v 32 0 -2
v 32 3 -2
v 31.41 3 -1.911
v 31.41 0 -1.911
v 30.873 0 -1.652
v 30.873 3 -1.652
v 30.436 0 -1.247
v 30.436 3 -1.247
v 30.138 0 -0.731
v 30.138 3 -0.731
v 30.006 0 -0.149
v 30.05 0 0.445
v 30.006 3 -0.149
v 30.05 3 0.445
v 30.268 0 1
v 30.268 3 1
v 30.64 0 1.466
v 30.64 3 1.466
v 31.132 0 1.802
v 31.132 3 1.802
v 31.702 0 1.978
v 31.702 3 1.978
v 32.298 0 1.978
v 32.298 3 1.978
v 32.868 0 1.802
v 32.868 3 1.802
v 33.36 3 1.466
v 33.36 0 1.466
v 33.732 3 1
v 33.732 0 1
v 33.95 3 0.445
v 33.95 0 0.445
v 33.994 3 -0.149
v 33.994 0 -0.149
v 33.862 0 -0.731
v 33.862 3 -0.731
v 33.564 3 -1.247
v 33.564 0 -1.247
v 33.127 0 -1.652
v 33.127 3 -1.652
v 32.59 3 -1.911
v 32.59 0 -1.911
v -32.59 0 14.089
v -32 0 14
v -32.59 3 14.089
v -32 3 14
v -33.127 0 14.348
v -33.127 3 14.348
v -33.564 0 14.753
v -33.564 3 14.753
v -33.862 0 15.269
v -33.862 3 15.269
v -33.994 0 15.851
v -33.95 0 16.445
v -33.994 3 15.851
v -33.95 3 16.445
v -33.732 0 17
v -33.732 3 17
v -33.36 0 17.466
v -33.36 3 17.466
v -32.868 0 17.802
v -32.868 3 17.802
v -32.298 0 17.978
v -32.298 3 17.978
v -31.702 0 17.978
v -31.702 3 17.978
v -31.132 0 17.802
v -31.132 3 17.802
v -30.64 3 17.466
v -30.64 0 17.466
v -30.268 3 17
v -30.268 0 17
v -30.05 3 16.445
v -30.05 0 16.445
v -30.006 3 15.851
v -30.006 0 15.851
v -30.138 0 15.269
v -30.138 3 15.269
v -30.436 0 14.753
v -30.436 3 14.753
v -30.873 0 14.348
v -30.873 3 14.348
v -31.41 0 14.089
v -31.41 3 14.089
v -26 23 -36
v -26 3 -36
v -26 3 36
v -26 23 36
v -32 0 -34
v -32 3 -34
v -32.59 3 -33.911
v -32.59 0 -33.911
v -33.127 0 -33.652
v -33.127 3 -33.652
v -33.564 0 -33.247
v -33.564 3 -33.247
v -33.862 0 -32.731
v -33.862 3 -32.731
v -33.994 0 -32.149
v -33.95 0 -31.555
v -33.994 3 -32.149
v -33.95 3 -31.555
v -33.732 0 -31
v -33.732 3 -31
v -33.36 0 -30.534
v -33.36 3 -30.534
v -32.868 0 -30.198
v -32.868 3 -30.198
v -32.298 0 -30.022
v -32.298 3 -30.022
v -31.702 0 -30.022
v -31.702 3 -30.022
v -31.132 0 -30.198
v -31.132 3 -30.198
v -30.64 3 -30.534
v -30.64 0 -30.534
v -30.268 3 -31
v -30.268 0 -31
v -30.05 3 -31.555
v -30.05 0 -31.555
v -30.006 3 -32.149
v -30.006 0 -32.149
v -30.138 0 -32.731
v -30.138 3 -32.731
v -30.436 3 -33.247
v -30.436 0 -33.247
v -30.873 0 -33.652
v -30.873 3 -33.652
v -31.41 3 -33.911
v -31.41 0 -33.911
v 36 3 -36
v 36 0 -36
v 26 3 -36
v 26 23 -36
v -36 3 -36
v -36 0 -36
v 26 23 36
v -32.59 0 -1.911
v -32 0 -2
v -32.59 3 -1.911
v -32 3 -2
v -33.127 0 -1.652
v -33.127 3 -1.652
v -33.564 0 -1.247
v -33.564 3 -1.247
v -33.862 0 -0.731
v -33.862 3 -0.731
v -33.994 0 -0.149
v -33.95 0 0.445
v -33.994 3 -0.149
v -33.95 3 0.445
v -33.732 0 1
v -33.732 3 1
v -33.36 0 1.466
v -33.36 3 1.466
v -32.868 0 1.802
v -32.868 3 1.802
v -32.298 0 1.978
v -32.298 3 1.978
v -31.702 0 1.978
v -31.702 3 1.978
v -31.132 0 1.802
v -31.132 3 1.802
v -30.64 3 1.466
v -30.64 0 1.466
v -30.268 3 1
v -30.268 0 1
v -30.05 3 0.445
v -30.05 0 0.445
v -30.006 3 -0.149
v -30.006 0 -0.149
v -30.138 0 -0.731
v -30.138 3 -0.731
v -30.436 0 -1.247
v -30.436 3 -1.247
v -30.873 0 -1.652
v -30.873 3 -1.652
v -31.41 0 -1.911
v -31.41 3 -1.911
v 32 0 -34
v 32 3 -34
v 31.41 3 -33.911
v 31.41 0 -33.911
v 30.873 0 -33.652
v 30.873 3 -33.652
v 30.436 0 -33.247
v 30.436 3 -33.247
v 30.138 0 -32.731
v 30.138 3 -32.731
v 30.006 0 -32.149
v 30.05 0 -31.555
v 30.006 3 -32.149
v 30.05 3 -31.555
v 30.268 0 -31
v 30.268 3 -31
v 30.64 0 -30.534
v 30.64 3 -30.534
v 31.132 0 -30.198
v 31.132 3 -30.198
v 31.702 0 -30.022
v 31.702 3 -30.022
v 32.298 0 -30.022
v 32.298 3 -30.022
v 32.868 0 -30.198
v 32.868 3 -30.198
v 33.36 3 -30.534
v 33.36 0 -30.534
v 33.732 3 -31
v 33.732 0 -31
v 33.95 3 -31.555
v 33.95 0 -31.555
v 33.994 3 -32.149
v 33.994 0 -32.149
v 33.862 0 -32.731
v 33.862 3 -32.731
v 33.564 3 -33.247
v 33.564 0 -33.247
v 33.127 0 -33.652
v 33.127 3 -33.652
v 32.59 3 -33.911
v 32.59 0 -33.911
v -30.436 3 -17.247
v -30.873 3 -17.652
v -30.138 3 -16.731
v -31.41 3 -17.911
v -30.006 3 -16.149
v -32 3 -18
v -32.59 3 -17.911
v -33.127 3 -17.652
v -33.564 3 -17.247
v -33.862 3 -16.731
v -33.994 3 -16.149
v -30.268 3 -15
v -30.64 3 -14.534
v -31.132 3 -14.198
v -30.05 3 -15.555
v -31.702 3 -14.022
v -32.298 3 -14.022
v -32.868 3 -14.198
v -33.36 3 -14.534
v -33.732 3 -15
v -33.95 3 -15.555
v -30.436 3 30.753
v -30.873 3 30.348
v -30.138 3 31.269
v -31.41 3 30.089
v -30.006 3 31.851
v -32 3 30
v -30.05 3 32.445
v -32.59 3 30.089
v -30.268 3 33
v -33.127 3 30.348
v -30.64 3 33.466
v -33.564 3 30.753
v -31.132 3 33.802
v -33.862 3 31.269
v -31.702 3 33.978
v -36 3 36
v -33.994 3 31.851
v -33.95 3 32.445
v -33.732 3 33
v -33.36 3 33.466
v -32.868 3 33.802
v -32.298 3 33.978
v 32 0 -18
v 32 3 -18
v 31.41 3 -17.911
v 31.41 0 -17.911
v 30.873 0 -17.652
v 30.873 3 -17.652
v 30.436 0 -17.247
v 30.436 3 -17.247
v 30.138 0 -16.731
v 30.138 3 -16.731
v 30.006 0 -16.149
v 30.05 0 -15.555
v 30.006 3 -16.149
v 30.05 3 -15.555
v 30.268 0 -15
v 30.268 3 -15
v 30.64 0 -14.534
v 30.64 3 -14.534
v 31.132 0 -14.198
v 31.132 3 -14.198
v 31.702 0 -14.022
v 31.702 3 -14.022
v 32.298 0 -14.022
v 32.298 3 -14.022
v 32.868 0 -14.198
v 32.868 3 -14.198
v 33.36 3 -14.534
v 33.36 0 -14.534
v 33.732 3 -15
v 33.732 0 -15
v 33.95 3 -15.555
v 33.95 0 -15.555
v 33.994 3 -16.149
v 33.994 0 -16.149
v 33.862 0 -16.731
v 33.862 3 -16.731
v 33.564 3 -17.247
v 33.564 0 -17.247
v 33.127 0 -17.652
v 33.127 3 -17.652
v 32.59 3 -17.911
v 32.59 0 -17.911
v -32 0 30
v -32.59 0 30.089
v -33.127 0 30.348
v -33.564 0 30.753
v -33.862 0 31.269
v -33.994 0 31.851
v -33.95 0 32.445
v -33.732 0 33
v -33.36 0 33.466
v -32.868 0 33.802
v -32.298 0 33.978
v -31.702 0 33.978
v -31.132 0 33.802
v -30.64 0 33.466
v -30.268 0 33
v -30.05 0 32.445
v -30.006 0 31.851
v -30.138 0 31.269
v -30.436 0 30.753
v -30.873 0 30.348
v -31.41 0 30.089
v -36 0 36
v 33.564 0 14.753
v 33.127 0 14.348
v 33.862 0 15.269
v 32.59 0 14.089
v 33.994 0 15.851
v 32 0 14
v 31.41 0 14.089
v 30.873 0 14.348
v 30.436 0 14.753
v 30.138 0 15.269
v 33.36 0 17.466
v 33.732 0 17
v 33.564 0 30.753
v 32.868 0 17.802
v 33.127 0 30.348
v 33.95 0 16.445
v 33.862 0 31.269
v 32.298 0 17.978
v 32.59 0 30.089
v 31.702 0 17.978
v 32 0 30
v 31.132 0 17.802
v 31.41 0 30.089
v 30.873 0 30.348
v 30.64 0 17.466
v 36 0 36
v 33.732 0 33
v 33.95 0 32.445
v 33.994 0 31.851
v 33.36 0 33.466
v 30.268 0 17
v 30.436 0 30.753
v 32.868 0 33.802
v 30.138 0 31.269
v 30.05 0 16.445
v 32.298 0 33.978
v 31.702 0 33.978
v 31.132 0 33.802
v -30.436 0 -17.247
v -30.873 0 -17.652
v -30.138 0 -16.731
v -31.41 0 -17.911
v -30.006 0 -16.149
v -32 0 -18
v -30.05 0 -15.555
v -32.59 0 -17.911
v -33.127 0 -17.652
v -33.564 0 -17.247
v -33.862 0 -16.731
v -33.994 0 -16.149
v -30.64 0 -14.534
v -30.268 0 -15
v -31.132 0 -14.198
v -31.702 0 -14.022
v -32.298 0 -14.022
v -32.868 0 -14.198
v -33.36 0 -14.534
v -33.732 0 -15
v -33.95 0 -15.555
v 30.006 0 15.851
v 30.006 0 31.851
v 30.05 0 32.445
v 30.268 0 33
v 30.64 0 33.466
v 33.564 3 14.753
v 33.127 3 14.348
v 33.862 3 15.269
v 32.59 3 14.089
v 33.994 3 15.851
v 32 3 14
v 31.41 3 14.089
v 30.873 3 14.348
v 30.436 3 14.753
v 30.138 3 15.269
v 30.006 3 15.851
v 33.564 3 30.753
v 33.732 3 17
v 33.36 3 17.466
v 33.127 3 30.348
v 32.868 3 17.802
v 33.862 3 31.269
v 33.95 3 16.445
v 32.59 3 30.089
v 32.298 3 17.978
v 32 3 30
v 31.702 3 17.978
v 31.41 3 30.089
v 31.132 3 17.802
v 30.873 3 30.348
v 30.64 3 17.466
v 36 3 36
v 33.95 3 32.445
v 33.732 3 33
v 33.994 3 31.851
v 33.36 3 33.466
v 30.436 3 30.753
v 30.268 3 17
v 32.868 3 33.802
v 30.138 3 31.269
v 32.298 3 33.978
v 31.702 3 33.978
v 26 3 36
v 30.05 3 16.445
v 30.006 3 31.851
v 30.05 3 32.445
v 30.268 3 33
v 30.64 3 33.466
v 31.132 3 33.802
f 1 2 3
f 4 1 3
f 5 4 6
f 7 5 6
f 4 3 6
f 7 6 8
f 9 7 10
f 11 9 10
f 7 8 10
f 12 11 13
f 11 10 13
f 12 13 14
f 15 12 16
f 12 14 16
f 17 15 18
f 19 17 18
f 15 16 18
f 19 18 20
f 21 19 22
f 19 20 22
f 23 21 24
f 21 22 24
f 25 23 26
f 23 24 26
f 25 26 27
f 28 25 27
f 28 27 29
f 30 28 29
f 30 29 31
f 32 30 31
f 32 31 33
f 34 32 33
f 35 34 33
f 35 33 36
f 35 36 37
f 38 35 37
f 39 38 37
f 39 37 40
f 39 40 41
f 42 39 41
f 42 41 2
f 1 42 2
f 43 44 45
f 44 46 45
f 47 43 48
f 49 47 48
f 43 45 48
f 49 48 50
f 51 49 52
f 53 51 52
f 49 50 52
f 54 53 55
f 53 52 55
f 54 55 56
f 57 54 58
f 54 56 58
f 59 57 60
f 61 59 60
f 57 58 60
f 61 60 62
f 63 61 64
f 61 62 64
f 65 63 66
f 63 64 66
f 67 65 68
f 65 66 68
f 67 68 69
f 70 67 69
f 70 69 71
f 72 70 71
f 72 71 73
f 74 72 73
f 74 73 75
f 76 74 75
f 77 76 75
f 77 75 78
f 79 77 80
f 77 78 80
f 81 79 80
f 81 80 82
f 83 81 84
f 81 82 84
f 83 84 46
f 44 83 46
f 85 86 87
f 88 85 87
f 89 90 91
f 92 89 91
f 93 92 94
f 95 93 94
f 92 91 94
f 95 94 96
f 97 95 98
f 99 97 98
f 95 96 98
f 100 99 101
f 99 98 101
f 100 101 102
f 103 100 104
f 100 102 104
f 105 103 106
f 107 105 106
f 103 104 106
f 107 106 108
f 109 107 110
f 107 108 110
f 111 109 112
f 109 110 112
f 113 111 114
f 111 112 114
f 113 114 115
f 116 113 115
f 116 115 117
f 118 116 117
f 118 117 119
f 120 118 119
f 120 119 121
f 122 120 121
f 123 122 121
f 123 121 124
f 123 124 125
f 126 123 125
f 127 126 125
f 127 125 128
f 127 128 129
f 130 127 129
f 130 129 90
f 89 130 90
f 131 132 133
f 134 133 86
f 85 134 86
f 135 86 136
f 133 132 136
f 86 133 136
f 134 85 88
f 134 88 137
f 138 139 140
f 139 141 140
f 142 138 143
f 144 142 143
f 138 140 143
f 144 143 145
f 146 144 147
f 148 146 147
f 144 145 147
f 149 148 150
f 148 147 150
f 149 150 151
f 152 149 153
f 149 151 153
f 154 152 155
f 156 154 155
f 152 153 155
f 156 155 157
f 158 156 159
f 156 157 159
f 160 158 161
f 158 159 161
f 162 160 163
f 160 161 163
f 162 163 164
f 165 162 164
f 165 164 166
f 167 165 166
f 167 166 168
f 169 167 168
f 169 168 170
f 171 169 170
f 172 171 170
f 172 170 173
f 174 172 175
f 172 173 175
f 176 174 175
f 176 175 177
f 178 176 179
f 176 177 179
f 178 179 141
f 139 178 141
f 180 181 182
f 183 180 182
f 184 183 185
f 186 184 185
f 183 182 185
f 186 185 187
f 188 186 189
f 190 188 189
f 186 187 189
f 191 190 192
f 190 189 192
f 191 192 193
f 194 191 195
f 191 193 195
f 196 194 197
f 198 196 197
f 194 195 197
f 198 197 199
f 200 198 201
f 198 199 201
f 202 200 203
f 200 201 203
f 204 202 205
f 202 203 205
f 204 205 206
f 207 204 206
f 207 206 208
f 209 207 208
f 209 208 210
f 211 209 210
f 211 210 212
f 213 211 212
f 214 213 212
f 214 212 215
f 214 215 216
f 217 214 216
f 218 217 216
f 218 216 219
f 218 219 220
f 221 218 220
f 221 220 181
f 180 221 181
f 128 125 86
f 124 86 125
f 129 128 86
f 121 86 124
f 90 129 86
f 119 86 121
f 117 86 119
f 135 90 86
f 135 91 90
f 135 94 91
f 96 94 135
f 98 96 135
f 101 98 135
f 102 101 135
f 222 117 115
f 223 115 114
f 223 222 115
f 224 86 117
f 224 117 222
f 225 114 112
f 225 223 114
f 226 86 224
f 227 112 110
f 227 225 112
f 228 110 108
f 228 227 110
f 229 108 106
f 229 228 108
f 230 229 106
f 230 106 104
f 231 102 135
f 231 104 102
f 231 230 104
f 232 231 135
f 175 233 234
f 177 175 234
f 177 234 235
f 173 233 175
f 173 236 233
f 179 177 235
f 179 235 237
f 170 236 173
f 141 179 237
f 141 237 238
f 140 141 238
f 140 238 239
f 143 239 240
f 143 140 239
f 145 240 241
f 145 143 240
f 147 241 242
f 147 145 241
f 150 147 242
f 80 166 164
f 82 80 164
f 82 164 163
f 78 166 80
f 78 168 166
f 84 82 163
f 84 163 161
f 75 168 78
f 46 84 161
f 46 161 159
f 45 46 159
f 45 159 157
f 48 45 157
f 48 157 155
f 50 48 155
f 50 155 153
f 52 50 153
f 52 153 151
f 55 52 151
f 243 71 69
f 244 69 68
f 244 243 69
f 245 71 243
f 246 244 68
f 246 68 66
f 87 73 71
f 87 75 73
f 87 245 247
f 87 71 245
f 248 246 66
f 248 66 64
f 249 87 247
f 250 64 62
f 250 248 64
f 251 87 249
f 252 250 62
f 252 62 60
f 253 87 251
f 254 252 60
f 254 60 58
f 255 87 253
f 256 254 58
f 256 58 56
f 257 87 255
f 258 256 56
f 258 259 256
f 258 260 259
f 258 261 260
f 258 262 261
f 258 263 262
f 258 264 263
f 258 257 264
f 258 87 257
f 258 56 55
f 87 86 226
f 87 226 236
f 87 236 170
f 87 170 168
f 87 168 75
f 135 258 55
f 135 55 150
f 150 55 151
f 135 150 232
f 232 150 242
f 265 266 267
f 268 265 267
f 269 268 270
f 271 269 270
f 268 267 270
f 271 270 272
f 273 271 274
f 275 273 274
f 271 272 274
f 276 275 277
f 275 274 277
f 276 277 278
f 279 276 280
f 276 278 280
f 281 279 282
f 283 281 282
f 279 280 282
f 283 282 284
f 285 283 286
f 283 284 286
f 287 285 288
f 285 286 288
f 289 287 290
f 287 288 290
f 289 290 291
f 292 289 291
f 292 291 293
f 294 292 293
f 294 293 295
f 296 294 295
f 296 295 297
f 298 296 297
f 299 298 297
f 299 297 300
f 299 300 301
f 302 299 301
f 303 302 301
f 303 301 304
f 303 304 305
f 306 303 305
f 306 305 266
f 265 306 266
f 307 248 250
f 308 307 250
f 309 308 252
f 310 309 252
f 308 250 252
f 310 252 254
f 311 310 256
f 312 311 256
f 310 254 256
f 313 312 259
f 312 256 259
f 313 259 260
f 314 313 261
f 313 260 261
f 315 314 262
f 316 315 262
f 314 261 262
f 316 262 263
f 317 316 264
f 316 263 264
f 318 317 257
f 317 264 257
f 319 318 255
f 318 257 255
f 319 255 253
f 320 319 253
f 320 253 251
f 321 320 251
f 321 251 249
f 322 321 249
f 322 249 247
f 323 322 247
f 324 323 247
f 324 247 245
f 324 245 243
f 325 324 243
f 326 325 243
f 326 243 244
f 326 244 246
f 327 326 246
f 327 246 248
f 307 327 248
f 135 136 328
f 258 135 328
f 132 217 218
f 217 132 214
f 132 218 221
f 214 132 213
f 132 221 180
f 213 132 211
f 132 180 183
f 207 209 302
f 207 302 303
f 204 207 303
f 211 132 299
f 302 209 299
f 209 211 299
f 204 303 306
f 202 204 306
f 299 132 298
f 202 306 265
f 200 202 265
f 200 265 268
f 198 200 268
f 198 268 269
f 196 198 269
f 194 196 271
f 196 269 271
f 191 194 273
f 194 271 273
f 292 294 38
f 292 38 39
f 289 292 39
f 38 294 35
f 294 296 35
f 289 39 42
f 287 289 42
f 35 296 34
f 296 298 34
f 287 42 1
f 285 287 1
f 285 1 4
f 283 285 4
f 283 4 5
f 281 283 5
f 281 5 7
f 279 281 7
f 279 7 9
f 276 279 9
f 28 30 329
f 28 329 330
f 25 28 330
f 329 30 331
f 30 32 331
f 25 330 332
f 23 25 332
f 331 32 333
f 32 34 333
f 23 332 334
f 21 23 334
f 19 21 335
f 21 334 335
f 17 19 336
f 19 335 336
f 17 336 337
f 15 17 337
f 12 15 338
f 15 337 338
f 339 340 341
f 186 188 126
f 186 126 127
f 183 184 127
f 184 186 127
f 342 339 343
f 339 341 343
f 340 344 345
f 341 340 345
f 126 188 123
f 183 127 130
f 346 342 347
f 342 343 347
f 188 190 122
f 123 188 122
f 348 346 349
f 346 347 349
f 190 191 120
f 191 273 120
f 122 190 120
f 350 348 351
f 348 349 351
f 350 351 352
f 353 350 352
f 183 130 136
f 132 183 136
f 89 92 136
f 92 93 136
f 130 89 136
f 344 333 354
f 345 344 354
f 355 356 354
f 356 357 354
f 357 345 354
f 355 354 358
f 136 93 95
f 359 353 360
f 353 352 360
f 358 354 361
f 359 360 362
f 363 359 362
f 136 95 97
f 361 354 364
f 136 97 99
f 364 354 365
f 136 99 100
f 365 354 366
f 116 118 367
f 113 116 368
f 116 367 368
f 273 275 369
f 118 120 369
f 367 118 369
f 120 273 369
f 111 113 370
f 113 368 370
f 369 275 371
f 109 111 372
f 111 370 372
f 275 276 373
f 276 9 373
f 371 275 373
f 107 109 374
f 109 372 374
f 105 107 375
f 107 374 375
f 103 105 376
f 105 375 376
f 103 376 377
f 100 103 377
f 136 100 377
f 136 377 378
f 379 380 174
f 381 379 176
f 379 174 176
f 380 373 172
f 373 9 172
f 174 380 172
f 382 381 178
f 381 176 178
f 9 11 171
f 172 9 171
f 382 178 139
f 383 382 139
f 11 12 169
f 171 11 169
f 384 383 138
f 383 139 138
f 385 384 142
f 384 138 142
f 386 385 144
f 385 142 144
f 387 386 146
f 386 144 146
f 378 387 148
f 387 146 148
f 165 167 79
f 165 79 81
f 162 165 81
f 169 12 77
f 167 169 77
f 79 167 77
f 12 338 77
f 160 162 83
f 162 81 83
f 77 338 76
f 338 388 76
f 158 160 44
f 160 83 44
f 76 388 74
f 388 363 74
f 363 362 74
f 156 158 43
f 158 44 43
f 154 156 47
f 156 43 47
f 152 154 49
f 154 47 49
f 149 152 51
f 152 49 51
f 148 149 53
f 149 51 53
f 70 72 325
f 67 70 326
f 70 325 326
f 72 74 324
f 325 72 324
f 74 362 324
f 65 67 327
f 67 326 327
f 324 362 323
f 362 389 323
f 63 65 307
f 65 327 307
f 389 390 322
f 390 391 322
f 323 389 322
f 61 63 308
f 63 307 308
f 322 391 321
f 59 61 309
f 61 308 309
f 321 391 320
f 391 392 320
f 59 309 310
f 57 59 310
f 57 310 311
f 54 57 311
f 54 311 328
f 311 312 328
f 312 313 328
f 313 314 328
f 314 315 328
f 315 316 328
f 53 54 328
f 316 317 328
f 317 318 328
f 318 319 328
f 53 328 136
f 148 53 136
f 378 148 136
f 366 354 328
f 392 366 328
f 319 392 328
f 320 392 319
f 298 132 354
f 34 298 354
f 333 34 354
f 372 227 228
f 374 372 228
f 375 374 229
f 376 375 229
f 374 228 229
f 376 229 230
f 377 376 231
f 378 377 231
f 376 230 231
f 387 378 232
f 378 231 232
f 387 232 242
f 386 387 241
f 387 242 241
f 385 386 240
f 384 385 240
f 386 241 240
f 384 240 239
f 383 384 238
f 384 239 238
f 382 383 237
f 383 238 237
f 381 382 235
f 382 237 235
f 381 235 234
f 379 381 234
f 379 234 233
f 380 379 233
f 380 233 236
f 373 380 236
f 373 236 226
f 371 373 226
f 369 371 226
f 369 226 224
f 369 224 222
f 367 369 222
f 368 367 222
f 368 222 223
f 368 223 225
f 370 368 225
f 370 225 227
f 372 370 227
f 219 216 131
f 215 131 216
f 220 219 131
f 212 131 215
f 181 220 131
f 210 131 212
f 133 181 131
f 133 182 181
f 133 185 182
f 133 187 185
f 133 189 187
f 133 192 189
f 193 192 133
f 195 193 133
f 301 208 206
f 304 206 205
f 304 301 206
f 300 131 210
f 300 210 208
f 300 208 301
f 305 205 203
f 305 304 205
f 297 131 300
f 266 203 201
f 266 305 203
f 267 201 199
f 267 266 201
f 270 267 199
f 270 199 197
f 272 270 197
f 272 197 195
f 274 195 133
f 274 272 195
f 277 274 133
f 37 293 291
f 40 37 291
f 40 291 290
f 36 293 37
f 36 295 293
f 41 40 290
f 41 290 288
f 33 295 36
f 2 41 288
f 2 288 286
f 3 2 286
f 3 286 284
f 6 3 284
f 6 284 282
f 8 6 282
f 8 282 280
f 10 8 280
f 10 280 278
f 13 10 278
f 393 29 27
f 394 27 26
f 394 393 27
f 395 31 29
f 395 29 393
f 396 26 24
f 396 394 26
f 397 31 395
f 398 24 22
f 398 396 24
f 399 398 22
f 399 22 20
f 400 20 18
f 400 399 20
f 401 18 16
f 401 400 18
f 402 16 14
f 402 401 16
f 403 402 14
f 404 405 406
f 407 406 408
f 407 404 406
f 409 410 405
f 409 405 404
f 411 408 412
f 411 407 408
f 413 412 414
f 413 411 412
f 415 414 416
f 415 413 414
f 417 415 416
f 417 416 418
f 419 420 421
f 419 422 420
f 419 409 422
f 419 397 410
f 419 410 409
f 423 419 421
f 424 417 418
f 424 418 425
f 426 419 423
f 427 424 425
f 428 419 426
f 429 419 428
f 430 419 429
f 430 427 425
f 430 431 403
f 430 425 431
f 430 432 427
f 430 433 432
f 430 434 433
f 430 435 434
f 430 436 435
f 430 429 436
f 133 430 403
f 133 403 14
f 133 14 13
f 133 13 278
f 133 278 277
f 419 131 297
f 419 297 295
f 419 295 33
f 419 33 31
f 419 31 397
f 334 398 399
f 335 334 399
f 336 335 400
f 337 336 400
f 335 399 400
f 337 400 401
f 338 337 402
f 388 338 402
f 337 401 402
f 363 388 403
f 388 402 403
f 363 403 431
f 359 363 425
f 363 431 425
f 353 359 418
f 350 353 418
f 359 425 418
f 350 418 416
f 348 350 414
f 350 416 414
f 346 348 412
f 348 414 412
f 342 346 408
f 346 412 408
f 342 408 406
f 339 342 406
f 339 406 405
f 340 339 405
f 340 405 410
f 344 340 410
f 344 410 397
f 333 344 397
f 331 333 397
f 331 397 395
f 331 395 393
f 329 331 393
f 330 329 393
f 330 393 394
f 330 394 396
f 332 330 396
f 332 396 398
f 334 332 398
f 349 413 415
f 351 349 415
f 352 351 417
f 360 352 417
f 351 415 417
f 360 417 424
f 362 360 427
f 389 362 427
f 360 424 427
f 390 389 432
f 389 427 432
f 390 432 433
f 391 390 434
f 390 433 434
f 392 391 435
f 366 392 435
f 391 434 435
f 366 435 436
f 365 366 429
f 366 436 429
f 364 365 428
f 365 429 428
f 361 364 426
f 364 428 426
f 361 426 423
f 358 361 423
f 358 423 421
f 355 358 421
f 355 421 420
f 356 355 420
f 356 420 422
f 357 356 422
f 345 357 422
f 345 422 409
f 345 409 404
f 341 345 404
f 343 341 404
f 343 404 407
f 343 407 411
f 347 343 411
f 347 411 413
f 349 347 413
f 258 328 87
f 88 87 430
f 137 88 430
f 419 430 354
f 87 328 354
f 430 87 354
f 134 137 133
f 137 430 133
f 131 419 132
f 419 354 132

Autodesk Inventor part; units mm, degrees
ref_plane "YZ Plane" through (0, 0, 0) normal (1, 0, 0) x (0, 1, 0)
ref_plane "XZ Plane" through (0, 0, 0) normal (0, 1, 0) x (-1, 0, 0)
ref_plane "XY Plane" through (0, 0, 0) normal (0, 0, 1) x (1, 0, 0)
sketch "Sketch1" plane through (0, 0, 0) normal (0, 1, 0) x (-1, 0, 0)
  line L0 (-36, -36) -> (36, -36)
  line L1 (36, -36) -> (36, 36)
  line L2 (36, 36) -> (-36, 36)
  line L3 (-36, 36) -> (-36, -36)
  line L4 (-36, -36) -> (36, 36) construction
  line L5 (36, -36) -> (-36, 36) construction
  point P0 (0, 0)
  dimension "d0" = 72
  dimension "d1" = 72
extrude "Extrusion1" add sketch "Sketch1" along normal blind 3
sketch "Sketch2" plane through (0, 3, 0) normal (0, 1, 0) x (1, 0, 0)
  line L0 (-36, -36) -> (36, -36) projected
  line L1 (26, 36) -> (-26, 36)
  line L2 (-26, 36) -> (-26, -36)
  line L3 (-26, -36) -> (26, -36)
  line L4 (26, -36) -> (26, 36)
  line L5 (26, 36) -> (-26, -36) construction
  line L6 (-26, 36) -> (26, -36) construction
  point P0 (0, 0)
  dimension "d4" = 52
extrude "Extrusion2" add sketch "Sketch2" along normal blind 20
sketch "Sketch3" plane through (0, 0, 0) normal (0, -1, 0) x (1, 0, 0)
  line L0 (-36, 36) -> (36, 36) projected
  line L1 (-36, 36) -> (-32, 36)
  line L2 (-32, 36) -> (-32, 32)
  line L3 (-32, 32) -> (-36, 32)
  line L4 (-36, 32) -> (-36, 36)
  circle A0 centre (-32, 16) radius 1.85 projected
  circle A1 centre (-32, 0) radius 1.85 projected
  circle A2 centre (-32, -16) radius 1.85 projected
  circle A3 centre (-32, -32) radius 1.85 projected
  point P0 (0, 0)
  dimension "d7" = 4
  dimension "d8" = 4
hole "Hole2" at (-32, 0, 32) at (-32, 0, 16) at (-32, 0, 0) at (-32, 0, -16) at (-32, 0, -32) direction (0, 1, 0) diameter 4 end through all
sketch "Sketch4" plane through (0, 0, 0) normal (0, -1, 0) x (1, 0, 0)
  circle A0 centre (32, -32) radius 1.85 projected
  circle A1 centre (32, -16) radius 1.85 projected
  circle A2 centre (32, 0) radius 1.85 projected
  circle A3 centre (32, 16) radius 1.85 projected
  circle A4 centre (32, 32) radius 1.85 projected
  point P0 (0, 0)
hole "Hole4" at (32, 0, 32) at (32, 0, 16) at (32, 0, 0) at (32, 0, -16) at (32, 0, -32) direction (0, 1, 0) diameter 4 end through all
properties part number "Legacy Module"
